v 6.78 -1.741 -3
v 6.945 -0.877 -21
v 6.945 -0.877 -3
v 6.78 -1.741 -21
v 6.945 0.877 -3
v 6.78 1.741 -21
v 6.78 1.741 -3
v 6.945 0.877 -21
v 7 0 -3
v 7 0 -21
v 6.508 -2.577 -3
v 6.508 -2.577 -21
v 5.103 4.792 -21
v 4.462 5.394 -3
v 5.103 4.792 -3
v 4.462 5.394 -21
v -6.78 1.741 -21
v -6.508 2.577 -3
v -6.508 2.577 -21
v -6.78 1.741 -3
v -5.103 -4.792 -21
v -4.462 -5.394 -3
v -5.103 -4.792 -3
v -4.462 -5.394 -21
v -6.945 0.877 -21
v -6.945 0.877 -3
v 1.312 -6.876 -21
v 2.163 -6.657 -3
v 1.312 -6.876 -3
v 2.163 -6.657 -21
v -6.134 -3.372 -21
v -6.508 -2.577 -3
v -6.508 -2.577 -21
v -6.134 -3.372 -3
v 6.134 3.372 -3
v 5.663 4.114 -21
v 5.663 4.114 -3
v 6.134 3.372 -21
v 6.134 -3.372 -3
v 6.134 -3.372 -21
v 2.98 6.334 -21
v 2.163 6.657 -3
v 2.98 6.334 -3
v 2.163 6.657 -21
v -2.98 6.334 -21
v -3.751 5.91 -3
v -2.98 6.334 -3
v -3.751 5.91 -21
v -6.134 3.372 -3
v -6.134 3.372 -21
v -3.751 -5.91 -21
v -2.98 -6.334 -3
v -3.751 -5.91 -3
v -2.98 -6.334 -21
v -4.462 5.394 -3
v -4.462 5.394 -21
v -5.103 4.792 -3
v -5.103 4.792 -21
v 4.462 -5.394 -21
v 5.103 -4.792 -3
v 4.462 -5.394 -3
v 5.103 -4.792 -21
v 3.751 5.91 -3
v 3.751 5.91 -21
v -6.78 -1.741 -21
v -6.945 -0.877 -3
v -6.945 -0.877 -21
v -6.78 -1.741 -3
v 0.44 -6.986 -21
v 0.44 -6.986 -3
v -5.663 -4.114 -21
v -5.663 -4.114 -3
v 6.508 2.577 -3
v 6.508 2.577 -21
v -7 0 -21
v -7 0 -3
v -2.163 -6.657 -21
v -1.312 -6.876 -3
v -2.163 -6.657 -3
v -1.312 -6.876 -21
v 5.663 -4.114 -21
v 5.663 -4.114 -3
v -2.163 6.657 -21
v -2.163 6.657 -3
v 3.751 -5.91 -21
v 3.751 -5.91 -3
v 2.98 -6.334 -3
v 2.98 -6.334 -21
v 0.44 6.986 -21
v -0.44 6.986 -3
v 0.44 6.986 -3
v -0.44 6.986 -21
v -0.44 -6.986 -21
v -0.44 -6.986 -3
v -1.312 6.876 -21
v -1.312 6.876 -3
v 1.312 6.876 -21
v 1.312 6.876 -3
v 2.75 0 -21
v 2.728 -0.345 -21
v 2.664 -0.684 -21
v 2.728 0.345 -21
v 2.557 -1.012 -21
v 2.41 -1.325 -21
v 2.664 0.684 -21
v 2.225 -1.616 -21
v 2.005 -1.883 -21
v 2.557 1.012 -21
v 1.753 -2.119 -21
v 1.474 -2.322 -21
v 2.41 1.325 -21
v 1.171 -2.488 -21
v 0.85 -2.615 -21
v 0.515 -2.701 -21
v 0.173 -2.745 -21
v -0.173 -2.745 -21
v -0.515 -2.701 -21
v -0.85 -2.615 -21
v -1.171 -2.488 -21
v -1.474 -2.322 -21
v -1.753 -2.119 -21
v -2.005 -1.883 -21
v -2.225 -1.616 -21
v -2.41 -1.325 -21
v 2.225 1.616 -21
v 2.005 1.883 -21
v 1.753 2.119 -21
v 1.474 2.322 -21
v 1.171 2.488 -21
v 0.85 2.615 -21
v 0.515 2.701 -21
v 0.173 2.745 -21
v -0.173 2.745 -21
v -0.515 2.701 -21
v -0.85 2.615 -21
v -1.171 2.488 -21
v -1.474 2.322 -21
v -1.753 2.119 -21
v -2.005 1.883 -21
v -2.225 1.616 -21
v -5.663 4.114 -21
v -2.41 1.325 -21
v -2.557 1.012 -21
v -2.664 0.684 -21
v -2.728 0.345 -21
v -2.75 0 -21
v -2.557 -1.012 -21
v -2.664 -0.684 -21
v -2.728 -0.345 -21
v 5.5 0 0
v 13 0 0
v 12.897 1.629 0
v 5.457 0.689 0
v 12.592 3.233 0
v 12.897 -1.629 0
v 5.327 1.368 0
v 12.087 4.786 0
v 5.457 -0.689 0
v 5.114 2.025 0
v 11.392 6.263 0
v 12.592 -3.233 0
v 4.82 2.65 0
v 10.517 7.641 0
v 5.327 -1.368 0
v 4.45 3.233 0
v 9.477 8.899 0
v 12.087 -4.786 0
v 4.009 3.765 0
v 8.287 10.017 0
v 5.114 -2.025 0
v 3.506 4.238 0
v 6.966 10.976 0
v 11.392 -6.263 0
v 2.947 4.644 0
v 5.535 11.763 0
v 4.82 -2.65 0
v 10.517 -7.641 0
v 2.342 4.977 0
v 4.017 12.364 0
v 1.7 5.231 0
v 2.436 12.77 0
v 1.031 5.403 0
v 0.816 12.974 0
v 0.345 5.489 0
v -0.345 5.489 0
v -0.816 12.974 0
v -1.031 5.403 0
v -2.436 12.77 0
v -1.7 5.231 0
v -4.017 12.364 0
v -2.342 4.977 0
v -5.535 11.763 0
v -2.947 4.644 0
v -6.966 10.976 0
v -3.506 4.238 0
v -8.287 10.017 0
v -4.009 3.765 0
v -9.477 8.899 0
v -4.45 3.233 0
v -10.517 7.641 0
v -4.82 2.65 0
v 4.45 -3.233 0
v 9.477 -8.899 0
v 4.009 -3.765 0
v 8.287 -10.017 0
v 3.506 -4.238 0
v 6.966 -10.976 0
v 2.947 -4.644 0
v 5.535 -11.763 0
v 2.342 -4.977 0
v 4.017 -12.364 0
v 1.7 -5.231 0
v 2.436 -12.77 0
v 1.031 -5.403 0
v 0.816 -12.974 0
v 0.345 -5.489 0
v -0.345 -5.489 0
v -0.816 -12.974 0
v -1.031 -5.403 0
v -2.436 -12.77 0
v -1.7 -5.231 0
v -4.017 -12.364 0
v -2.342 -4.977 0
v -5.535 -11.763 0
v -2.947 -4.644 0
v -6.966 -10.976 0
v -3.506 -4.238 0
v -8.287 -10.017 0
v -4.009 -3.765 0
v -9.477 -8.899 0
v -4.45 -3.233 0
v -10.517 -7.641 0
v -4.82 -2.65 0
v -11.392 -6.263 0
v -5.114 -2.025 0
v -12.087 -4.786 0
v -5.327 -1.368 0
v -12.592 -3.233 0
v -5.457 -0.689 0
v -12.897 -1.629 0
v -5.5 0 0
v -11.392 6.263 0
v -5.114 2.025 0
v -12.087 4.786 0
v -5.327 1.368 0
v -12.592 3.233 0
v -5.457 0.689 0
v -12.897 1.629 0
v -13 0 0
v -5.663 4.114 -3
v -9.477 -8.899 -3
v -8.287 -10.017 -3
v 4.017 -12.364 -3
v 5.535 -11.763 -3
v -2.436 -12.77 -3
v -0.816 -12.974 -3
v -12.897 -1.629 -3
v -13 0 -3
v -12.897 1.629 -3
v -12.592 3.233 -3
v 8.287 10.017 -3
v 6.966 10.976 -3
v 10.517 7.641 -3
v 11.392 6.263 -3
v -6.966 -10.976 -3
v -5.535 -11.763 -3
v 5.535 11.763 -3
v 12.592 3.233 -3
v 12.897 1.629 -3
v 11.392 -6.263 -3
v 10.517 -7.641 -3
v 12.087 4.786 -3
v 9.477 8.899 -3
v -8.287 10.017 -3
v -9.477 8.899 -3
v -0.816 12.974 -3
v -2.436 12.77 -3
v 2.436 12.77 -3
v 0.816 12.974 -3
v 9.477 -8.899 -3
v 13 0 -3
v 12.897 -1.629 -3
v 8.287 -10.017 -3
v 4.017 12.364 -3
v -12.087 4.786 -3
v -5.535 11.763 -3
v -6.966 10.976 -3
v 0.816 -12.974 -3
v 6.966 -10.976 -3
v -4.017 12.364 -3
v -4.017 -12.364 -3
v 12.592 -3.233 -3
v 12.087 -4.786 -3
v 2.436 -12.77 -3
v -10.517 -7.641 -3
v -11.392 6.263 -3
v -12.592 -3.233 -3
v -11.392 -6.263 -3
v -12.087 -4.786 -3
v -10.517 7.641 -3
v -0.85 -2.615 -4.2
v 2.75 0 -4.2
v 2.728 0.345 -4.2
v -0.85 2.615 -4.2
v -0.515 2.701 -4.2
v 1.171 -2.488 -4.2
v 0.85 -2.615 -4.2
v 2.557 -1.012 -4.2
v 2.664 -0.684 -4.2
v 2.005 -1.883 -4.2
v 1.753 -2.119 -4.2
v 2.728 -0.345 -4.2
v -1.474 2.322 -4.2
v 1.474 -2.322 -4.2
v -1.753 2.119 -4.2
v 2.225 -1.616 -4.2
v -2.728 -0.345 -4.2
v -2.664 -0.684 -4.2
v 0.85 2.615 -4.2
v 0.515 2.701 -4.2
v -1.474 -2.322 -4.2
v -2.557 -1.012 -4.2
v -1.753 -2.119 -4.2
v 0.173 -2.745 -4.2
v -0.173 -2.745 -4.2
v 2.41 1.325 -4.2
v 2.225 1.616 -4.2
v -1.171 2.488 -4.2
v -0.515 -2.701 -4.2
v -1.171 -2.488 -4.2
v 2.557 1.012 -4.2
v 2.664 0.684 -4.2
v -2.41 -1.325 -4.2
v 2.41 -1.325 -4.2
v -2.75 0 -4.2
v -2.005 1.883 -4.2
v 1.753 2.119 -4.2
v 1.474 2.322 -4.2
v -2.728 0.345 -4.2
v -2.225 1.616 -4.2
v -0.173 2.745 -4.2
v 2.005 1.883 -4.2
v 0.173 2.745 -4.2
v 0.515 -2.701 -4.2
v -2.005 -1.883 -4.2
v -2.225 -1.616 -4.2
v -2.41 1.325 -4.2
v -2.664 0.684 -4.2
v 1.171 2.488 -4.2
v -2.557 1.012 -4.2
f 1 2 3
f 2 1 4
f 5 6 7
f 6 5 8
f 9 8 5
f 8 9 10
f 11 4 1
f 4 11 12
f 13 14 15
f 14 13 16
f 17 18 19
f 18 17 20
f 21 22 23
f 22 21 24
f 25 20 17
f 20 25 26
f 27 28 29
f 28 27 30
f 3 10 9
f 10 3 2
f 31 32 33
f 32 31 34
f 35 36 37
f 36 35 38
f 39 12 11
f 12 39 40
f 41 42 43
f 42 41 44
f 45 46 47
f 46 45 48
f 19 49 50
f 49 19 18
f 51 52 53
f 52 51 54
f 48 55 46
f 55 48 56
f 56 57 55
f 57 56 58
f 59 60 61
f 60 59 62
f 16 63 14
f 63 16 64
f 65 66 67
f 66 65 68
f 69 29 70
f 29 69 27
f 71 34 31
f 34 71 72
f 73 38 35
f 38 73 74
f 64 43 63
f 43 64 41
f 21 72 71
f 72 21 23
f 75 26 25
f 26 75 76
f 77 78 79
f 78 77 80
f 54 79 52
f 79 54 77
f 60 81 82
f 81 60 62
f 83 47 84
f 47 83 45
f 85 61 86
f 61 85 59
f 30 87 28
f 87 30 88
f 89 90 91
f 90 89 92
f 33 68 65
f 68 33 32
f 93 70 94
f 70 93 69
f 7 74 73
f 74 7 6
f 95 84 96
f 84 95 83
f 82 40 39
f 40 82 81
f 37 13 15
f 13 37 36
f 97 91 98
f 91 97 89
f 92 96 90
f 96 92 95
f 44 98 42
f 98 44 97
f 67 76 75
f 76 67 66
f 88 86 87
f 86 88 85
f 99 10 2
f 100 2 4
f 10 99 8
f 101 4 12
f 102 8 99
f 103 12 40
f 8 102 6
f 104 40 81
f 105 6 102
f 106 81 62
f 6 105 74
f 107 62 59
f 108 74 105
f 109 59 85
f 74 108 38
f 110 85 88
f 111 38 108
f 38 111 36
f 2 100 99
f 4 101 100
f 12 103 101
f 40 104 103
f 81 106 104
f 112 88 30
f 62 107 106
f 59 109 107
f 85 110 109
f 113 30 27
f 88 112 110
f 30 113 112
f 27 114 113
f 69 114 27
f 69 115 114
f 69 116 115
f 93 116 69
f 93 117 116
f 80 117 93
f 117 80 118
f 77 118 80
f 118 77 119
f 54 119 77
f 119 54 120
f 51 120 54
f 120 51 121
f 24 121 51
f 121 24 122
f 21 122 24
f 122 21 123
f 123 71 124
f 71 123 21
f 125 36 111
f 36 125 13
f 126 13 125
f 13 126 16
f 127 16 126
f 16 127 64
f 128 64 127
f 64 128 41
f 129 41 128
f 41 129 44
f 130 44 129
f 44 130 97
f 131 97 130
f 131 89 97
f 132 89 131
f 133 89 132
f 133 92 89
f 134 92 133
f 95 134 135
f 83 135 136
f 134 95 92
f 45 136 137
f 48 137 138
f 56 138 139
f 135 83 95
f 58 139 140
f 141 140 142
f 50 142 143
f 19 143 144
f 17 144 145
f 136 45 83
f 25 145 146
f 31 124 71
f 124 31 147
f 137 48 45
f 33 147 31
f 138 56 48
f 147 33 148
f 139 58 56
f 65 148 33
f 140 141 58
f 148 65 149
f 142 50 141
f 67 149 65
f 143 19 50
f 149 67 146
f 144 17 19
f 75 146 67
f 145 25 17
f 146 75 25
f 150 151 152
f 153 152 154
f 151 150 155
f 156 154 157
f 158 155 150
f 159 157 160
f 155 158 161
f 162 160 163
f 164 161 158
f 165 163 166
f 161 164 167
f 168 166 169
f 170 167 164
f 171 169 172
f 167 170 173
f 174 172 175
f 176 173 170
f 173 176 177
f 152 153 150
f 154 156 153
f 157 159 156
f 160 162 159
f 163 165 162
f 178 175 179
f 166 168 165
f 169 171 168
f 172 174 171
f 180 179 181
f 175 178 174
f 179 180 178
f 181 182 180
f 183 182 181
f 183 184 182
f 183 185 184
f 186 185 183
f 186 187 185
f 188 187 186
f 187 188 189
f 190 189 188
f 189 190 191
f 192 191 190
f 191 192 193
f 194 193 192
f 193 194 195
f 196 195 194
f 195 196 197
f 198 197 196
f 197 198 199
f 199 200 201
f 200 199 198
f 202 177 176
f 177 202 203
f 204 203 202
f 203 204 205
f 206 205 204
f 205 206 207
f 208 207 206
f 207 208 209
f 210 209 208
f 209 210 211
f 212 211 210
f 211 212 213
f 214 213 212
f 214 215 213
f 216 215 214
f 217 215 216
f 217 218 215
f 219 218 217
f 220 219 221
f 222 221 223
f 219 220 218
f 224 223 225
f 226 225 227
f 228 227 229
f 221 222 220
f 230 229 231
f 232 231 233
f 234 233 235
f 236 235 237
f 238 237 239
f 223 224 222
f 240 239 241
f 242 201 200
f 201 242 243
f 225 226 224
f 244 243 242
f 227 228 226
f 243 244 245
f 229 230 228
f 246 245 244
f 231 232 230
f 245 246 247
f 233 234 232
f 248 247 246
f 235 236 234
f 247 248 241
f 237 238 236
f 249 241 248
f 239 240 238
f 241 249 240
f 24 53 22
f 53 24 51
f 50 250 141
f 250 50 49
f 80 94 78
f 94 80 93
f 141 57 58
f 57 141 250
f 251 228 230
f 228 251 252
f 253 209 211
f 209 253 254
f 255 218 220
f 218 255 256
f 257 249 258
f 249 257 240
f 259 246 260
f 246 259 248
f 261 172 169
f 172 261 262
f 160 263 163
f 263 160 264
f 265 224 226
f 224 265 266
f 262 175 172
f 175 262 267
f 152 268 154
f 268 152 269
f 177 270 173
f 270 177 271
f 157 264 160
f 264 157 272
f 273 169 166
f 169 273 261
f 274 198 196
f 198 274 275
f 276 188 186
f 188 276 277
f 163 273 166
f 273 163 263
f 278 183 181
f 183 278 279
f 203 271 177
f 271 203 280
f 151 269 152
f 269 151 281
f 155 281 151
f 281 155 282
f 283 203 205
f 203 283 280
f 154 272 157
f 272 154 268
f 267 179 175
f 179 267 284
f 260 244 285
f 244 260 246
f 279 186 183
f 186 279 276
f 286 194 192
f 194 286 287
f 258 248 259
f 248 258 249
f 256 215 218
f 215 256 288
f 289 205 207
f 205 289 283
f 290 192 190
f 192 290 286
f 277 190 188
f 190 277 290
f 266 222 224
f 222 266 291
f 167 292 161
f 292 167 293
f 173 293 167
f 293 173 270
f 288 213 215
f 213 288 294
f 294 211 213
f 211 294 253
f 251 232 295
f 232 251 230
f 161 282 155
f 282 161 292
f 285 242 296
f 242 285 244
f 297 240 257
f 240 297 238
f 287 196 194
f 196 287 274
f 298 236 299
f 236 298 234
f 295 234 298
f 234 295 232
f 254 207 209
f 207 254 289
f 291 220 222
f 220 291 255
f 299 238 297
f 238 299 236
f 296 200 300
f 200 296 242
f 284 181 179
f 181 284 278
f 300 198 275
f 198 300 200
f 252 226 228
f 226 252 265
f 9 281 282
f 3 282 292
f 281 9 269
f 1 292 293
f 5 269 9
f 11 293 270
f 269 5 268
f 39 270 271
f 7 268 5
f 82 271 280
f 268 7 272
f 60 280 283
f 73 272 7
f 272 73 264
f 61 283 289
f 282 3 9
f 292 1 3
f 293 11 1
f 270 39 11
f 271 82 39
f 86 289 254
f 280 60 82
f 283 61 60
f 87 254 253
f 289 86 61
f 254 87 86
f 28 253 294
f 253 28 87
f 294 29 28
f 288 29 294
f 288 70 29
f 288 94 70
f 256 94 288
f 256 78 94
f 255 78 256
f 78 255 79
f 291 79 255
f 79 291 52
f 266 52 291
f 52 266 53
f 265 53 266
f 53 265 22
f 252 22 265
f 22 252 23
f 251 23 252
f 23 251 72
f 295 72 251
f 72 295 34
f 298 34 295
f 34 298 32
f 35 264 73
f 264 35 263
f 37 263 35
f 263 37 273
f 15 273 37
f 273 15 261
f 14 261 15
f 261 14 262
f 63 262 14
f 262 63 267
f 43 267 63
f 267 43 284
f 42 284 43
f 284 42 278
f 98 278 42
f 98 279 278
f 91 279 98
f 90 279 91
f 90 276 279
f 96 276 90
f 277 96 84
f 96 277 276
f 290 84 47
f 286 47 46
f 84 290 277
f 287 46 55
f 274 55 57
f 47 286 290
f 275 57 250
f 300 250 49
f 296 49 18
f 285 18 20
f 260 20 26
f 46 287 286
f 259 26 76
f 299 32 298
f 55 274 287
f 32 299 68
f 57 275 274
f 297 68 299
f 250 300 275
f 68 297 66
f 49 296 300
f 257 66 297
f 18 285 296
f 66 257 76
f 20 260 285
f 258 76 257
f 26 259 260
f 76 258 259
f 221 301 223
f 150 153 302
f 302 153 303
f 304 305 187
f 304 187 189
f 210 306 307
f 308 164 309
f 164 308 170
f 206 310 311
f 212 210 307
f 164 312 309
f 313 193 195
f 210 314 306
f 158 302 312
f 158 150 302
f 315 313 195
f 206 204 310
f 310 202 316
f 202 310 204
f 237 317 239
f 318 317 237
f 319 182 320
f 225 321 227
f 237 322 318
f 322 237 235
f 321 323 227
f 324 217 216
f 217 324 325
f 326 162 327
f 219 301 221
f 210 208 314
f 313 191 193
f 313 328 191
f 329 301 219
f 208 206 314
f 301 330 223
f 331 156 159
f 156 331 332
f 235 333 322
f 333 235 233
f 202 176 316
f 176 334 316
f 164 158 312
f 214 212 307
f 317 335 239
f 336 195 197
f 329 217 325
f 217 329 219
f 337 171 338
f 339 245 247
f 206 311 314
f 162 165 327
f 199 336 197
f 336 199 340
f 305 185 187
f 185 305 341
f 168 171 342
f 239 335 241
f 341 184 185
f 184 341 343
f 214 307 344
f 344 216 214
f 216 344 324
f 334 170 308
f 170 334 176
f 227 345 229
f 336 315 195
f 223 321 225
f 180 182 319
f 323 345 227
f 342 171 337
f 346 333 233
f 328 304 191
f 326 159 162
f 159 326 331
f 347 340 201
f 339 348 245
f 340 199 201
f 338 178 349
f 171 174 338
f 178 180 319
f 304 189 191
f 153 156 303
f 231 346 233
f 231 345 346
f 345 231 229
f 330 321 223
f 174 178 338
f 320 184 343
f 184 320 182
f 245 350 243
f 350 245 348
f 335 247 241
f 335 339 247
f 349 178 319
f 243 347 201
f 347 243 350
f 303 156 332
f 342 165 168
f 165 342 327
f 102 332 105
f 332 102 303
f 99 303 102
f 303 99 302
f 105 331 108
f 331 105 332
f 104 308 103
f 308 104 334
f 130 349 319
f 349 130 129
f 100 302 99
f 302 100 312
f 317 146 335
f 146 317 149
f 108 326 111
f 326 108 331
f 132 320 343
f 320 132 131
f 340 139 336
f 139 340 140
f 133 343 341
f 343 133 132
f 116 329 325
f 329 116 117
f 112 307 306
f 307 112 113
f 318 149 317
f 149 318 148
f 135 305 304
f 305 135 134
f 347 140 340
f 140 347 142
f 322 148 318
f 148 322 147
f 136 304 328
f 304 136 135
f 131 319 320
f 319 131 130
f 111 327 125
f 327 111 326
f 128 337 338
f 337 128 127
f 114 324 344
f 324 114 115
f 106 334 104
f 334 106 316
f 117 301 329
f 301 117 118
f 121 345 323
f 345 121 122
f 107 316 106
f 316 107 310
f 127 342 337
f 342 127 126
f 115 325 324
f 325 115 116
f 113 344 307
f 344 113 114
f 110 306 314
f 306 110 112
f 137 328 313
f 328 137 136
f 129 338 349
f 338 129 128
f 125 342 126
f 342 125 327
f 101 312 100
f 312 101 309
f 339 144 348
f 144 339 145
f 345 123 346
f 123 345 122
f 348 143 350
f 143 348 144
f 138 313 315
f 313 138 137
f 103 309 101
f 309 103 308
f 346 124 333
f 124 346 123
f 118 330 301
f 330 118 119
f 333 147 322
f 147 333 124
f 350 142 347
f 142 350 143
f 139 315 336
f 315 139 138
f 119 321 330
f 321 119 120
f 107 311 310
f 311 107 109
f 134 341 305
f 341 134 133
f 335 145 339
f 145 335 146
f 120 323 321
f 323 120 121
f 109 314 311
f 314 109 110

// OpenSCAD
$fn = 50;


difference() {
	union() {
		translate(v = [0, 0, -21.0000000000]) {
			cylinder(h = 21, r = 7.0000000000);
		}
		translate(v = [0, 0, -3.0000000000]) {
			cylinder(h = 3, r = 13.0000000000);
		}
	}
	union() {
		translate(v = [0, 0, 0]) {
			rotate(a = [0, 0, 0]) {
				difference() {
					union() {
						#translate(v = [0, 0, -21.0000000000]) {
							cylinder(h = 21, r = 2.2500000000);
						}
						#translate(v = [0, 0, -4.2000000000]) {
							cylinder(h = 4.2000000000, r = 7.0000000000, r1 = 2.7500000000, r2 = 5.5000000000);
						}
						#translate(v = [0, 0, -21.0000000000]) {
							cylinder(h = 21, r = 2.7500000000);
						}
						#translate(v = [0, 0, -21.0000000000]) {
							cylinder(h = 21, r = 2.2500000000);
						}
					}
					union();
				}
			}
		}
	}
}
